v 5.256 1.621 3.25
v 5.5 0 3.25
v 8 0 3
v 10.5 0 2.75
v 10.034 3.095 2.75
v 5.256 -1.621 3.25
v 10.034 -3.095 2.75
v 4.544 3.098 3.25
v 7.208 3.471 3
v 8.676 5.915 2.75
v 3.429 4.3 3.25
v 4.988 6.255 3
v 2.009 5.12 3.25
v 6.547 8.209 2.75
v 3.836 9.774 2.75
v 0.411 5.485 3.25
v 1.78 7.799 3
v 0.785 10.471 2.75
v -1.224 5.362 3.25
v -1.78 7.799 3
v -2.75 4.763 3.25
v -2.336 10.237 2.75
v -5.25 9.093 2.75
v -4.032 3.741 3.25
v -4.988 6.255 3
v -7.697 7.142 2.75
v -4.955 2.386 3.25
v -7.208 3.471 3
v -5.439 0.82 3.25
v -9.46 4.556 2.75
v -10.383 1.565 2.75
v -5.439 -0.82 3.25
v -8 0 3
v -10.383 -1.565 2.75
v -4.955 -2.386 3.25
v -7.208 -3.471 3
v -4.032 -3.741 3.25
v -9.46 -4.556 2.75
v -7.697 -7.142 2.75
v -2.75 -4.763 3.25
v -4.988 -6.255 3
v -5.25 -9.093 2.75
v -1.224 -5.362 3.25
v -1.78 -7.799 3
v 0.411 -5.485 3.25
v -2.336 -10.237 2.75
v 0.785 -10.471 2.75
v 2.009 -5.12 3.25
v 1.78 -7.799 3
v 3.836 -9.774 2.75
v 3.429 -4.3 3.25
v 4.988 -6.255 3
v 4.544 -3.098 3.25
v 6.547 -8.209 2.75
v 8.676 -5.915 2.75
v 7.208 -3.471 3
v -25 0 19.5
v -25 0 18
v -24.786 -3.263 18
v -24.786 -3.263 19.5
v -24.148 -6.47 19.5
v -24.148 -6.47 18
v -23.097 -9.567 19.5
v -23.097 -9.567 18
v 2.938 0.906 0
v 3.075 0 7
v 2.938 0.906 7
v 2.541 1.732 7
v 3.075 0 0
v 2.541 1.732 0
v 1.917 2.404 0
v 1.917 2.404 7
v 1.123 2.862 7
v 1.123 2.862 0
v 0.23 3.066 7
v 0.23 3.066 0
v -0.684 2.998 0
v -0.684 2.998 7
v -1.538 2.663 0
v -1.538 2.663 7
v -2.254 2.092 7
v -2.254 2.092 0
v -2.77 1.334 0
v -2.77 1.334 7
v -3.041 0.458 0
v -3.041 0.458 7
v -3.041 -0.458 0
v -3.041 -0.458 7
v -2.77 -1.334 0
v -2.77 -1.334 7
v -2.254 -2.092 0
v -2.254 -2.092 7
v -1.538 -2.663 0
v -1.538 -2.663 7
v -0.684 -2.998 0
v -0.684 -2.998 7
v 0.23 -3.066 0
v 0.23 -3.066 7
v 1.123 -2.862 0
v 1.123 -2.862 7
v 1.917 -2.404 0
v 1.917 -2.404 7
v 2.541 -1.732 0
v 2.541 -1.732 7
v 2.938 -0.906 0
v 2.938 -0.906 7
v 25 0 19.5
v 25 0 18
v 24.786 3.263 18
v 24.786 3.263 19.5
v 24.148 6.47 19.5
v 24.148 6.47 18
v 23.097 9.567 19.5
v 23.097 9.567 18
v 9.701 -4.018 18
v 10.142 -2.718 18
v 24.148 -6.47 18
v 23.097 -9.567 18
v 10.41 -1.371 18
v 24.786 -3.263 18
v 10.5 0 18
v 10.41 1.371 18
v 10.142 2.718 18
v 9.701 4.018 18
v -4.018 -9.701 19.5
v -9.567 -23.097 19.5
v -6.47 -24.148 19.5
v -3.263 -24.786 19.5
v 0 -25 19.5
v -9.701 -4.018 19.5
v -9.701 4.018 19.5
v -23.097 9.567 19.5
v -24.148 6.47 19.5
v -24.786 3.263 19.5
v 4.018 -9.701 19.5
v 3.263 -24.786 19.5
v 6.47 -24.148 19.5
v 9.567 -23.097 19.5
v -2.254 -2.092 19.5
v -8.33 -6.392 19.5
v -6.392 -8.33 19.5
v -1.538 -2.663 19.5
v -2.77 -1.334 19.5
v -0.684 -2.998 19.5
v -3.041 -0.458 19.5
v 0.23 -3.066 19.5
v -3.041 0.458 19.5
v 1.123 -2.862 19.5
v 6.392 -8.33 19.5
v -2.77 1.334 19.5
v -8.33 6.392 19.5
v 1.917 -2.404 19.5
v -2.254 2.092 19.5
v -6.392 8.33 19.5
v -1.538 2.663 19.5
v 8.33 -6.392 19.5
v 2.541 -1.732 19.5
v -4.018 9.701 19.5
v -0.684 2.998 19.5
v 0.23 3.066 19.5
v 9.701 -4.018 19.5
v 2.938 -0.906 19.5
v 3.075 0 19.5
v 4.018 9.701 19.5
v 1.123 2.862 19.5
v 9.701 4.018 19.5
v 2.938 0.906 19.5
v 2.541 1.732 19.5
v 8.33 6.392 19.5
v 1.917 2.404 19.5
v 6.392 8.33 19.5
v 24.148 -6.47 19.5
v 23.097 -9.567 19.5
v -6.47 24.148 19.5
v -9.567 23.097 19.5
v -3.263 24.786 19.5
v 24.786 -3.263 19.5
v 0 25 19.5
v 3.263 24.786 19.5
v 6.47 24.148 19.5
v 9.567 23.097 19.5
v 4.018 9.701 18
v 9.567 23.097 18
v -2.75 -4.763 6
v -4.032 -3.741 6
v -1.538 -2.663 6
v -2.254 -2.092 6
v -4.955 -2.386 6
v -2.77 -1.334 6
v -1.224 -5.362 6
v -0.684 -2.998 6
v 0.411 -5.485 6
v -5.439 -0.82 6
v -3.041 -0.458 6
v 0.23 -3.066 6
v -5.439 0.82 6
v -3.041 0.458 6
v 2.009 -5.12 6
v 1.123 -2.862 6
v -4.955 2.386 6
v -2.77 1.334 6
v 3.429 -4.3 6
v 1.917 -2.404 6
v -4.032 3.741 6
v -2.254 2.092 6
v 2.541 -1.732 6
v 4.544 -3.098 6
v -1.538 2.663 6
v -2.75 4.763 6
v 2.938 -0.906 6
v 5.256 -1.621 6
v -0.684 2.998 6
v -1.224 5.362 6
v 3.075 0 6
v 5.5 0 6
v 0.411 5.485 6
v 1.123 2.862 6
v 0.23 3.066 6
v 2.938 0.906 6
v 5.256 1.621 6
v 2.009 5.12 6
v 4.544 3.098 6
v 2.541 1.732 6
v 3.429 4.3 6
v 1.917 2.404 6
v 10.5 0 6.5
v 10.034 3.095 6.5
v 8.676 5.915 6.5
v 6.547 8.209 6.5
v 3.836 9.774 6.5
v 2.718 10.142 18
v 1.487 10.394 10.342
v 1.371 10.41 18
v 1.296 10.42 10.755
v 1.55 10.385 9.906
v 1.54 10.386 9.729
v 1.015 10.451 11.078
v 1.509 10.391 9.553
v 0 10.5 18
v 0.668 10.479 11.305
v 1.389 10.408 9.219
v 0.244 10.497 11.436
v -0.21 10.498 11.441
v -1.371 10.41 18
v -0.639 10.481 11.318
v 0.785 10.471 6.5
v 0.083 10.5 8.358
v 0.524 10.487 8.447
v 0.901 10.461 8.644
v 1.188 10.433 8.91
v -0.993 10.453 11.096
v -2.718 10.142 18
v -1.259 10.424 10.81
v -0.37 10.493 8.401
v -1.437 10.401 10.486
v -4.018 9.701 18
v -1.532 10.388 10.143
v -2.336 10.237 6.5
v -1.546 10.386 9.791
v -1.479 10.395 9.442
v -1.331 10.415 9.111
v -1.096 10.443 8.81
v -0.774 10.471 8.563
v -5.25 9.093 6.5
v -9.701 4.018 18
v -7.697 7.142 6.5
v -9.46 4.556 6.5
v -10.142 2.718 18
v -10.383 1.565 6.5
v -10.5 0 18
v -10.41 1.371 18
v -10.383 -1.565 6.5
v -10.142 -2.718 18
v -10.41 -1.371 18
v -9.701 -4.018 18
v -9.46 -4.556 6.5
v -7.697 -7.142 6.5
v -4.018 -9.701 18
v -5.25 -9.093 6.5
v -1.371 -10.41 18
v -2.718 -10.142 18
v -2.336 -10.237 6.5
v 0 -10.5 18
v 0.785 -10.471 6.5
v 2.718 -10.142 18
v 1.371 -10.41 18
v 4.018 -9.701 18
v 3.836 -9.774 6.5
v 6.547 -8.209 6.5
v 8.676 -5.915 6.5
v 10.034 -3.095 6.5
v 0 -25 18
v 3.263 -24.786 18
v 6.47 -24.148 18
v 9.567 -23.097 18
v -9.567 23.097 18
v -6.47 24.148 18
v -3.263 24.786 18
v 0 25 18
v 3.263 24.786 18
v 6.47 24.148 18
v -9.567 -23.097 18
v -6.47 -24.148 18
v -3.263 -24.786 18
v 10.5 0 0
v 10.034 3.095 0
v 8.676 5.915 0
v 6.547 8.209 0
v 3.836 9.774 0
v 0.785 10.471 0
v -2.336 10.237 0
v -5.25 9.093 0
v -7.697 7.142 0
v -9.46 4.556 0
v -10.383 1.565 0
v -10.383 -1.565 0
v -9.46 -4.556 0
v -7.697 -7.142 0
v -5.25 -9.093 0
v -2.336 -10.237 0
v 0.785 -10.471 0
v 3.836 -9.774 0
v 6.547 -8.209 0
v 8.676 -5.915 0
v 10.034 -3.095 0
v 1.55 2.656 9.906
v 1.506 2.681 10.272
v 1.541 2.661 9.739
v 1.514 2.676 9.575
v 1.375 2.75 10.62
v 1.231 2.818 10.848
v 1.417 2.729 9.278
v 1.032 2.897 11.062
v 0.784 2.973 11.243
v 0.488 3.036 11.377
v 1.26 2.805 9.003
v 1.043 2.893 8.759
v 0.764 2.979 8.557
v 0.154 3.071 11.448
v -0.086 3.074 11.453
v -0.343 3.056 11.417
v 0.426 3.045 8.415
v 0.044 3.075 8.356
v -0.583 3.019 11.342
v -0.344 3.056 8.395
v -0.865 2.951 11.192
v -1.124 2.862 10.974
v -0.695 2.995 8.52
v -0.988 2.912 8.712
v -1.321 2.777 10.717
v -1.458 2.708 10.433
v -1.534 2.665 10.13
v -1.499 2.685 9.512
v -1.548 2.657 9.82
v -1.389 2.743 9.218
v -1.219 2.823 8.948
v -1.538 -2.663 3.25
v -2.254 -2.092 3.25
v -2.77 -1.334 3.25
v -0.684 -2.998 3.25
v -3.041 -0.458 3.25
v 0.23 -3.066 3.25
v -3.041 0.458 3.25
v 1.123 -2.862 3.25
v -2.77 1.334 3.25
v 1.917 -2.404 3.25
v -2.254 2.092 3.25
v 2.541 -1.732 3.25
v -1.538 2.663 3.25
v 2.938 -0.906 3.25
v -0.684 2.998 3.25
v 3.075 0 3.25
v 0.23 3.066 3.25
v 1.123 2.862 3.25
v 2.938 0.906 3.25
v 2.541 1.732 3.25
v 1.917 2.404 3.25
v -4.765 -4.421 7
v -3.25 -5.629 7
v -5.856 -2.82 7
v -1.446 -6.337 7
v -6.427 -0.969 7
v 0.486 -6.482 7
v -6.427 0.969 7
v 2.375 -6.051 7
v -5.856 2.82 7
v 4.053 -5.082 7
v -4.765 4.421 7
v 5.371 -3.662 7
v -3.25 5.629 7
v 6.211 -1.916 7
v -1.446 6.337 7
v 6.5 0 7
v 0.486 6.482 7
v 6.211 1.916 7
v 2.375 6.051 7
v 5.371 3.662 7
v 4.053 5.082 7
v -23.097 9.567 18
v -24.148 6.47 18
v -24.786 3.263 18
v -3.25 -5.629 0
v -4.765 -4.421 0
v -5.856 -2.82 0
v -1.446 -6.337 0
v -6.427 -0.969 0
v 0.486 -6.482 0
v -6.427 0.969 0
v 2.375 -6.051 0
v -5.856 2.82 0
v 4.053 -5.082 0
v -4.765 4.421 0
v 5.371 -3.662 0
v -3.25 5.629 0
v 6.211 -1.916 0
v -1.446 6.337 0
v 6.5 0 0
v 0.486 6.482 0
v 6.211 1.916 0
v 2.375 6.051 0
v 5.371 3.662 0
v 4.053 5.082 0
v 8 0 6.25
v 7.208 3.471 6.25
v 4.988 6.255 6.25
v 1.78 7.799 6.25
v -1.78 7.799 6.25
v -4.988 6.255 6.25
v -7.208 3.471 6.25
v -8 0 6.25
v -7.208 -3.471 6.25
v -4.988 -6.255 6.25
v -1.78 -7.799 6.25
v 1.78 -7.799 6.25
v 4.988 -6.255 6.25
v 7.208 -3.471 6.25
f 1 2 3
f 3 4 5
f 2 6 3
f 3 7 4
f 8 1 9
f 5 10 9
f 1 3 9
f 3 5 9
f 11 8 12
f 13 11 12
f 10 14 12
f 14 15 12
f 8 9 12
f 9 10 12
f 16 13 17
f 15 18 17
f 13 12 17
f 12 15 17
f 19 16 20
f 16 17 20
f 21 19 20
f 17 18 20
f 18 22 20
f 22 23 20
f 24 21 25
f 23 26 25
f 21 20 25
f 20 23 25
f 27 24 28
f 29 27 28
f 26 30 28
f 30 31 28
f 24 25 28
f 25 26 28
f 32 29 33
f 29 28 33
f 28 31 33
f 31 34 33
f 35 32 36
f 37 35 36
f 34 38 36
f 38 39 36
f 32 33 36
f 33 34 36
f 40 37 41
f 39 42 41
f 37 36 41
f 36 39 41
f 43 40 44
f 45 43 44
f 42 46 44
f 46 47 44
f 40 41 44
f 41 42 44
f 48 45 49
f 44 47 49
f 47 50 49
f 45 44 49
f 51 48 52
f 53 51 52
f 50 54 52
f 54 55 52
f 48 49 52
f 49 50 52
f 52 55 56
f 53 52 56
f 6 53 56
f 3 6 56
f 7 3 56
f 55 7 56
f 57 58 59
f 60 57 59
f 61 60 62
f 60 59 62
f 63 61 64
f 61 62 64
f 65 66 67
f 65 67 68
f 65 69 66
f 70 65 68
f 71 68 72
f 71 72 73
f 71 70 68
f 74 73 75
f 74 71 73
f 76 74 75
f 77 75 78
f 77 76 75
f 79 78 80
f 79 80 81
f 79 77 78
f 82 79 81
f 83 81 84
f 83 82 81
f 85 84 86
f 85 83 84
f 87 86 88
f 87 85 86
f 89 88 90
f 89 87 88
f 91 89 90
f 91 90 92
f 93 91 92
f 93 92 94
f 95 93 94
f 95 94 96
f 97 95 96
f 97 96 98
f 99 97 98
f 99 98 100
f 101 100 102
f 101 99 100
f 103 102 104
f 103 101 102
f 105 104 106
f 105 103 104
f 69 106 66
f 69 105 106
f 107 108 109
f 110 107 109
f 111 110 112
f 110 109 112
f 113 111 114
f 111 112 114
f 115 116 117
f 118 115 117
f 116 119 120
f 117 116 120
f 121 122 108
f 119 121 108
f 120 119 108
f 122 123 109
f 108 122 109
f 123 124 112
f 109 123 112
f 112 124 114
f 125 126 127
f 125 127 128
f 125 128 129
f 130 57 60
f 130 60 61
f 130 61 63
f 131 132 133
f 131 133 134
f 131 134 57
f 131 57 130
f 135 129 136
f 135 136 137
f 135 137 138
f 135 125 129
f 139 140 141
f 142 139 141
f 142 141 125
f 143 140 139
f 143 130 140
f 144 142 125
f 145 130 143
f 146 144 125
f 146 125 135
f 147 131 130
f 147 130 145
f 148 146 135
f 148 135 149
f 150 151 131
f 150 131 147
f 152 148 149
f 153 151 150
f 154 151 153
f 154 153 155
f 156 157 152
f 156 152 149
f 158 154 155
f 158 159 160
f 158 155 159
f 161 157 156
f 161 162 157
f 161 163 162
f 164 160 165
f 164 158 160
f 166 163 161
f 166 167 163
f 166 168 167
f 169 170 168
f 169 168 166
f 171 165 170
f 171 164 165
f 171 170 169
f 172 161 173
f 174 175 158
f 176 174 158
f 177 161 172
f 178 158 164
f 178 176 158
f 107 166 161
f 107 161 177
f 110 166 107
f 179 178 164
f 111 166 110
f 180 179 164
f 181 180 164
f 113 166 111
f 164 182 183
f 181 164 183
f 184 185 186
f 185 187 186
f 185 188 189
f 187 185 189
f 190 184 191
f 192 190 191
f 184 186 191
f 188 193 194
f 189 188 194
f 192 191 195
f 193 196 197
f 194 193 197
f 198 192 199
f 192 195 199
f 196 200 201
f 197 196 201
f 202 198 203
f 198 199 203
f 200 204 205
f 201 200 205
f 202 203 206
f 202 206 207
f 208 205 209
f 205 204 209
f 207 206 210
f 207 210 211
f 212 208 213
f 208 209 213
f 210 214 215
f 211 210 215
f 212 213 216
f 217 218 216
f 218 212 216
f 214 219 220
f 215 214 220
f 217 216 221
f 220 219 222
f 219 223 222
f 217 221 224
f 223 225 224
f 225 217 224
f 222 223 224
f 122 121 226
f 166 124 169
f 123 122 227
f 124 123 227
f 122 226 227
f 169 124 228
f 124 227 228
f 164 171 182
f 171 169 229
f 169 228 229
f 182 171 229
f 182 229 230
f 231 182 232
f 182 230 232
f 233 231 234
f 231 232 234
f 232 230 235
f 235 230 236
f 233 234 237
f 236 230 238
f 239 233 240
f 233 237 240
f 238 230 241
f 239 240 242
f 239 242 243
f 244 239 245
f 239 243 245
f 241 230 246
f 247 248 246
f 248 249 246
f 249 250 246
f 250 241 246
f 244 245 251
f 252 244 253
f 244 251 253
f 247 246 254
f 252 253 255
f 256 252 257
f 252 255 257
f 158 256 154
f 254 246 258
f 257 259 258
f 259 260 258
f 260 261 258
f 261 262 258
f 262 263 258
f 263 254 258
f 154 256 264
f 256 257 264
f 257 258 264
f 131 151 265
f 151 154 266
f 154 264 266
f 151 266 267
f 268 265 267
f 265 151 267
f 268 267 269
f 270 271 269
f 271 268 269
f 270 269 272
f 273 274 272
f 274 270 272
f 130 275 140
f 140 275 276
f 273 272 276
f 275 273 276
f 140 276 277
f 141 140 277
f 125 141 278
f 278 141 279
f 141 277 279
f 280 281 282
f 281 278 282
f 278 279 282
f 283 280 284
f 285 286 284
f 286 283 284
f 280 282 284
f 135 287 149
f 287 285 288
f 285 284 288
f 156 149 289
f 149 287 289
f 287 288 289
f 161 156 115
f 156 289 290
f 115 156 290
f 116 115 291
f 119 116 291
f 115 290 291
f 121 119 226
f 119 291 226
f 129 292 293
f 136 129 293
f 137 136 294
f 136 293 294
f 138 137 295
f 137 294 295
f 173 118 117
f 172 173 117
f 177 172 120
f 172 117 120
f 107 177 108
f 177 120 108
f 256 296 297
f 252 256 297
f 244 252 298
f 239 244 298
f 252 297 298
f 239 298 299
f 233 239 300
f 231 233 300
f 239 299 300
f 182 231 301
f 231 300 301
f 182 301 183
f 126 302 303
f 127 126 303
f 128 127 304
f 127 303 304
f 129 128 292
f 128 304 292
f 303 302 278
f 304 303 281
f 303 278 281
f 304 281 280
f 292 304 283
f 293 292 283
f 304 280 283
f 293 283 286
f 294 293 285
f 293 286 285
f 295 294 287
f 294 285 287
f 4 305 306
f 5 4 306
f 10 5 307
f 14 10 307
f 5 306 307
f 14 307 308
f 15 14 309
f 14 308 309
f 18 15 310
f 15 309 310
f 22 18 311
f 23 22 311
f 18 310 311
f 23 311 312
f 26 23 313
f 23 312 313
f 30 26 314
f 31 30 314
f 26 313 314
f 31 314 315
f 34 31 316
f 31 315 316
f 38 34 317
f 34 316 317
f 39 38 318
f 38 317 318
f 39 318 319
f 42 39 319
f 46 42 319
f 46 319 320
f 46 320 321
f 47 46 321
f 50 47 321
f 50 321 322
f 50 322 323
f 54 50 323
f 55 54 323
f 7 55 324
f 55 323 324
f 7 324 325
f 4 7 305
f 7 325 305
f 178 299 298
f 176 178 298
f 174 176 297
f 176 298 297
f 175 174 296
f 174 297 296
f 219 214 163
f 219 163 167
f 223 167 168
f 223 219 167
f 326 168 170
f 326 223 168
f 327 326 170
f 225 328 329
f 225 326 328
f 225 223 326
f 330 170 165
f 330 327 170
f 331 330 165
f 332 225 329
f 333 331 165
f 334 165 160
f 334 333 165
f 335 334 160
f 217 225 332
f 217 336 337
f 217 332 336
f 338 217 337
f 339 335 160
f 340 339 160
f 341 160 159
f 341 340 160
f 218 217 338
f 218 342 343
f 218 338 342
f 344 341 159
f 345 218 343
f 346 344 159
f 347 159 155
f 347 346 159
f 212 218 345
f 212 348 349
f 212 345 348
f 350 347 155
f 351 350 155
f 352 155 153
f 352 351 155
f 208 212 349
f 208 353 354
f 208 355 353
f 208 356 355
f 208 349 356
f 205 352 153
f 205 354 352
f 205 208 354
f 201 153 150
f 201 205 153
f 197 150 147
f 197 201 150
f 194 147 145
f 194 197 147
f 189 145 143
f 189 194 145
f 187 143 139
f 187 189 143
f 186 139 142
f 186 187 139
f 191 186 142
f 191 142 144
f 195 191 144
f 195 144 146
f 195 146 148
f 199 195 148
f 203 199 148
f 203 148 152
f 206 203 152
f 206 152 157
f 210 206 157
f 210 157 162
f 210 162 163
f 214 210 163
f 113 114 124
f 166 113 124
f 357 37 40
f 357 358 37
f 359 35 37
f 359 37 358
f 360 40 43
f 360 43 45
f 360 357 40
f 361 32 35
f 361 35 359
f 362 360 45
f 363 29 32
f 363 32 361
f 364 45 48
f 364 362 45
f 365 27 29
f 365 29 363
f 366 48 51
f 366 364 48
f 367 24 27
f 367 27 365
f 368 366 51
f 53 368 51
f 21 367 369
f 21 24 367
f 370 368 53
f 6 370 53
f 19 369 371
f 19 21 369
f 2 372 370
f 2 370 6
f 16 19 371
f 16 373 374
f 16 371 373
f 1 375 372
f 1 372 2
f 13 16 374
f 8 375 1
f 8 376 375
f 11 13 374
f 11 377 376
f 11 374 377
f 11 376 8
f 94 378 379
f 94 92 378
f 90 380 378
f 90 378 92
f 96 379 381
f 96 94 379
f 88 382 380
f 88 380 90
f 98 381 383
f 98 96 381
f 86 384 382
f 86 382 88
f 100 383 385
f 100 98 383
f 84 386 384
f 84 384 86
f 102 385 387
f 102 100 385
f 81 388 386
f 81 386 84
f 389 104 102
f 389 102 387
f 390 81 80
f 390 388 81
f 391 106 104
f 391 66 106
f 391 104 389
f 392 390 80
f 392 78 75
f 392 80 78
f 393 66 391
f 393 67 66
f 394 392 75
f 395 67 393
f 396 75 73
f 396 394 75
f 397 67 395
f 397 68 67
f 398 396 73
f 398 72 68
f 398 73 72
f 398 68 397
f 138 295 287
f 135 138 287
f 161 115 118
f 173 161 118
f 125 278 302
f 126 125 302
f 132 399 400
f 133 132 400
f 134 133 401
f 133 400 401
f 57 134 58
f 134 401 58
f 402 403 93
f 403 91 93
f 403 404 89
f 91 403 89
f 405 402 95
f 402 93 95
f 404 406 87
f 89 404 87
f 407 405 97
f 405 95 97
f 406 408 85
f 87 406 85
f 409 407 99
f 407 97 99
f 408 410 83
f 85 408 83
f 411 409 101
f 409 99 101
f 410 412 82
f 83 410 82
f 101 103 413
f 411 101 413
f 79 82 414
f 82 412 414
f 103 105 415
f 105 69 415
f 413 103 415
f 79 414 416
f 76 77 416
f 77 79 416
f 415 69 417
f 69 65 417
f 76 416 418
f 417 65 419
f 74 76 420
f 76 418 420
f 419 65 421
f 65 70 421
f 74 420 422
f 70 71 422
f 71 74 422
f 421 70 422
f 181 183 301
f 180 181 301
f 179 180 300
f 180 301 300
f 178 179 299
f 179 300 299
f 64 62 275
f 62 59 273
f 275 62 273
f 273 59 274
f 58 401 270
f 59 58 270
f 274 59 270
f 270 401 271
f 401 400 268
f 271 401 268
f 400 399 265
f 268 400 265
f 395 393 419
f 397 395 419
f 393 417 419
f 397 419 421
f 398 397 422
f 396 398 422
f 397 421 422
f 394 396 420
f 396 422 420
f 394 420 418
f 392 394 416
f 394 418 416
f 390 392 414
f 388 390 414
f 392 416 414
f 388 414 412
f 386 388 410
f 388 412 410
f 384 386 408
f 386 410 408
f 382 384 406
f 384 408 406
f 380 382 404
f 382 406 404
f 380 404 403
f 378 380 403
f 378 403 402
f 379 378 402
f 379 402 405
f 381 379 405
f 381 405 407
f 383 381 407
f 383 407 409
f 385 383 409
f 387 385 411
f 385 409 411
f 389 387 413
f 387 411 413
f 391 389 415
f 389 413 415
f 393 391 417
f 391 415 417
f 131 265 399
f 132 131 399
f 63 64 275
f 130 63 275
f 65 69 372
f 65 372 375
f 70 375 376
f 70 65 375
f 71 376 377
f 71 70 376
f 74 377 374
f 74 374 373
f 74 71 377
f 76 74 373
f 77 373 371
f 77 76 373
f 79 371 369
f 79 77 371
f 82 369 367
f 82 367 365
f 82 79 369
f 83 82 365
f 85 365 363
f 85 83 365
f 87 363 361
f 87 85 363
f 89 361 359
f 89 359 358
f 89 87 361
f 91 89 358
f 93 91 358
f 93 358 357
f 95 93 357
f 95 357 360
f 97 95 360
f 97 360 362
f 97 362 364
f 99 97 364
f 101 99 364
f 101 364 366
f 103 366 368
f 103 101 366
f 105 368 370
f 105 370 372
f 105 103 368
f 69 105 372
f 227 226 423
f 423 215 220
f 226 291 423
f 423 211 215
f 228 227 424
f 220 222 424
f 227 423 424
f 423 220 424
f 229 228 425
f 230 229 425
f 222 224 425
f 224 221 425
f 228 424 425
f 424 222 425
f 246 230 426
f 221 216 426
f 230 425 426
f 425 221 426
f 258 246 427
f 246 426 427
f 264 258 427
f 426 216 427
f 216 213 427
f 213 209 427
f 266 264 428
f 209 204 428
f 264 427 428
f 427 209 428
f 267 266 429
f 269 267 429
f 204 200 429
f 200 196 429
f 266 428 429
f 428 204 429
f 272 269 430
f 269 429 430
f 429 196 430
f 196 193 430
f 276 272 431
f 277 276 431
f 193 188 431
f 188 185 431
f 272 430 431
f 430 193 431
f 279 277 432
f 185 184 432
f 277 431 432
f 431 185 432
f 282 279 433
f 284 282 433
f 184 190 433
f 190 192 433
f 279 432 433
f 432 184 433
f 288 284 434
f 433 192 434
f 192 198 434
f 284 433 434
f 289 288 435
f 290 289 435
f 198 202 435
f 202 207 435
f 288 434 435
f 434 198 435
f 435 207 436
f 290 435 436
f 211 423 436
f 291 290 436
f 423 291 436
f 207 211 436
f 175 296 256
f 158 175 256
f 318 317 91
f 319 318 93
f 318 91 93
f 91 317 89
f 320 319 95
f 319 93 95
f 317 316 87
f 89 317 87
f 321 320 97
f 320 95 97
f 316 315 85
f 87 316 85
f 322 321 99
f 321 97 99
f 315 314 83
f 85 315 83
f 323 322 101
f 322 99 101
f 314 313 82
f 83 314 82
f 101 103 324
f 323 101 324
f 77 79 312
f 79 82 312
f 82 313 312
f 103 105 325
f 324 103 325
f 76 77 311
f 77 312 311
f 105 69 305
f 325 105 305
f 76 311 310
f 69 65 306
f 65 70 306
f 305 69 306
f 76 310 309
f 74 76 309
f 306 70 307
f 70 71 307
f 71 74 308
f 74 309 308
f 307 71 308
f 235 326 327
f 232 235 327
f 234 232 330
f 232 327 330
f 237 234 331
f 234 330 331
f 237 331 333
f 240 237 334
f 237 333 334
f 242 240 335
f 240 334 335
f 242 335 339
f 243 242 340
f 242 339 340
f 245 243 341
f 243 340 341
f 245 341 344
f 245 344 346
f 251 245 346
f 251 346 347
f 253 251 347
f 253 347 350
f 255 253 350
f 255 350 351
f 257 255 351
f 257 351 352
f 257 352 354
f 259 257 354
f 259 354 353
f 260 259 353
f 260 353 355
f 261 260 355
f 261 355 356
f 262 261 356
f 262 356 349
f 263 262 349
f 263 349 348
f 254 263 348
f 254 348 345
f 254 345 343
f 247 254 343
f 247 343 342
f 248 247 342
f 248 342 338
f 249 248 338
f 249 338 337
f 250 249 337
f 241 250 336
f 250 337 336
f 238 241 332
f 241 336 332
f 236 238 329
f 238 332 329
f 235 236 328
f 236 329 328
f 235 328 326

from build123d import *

# Parameters (mm, degrees)
F0_R      = 10.5
F0_R_2    = 6.5
F0_R_3    = 3.075
F1_DEPTH  = 3.25
F2_DEPTH  = 6
F3_R      = 10.5
F3_R_2    = 6.5
F3_R_3    = 3.075
F4_DEPTH  = 12
F6_DEPTH  = 1.5
F7_DEPTH  = 1.5
F8_R      = 1.55
F9_DEPTH  = 20
F10_SIZE2 = 0.5
F10_SIZE  = 5
F11_SIZE2 = 5
F11_SIZE  = 0.5
F12_DEPTH = 1


with BuildPart() as f1:
    # F0 (on Top) → F1 (new body)
    with BuildSketch(Plane.XY):
        Circle(F0_R)
        Circle(F0_R_2, mode=Mode.SUBTRACT)
        Circle(F0_R_2)
        Circle(F0_R_3, mode=Mode.SUBTRACT)
    extrude(amount=F1_DEPTH)

    # F10
    f10_edges = [f1.edges().sort_by_distance(p)[0] for p in [
        (-10.5, 0, 3.25),
    ]]
    f10_side = f1.faces().sort_by_distance((-3.371985, 0, 3.25))[0]
    chamfer(f10_edges, length=F10_SIZE, length2=F10_SIZE2, reference=f10_side)


with BuildPart() as f2:
    # F0 (on Top) → F2 (new body)
    with BuildSketch(Plane.XY):
        Circle(F0_R_2)
        Circle(F0_R_3, mode=Mode.SUBTRACT)
    extrude(amount=F2_DEPTH)

    # F12 (add): a face of the model
    f12_faces = [f2.faces().sort_by_distance(p)[0] for p in [
        (-6.3161522369, 0, 6),
    ]]
    extrude(f12_faces, amount=F12_DEPTH)


with BuildPart() as f4:
    # F3 (on face) → F4 (new body)
    with BuildSketch(Plane.XY.offset(6)):
        Circle(F3_R)
        Circle(F3_R_2, mode=Mode.SUBTRACT)
        Circle(F3_R_2)
        Circle(F3_R_3, mode=Mode.SUBTRACT)
    extrude(amount=F4_DEPTH)

    # F5 (on face) → F6 (join)
    with BuildSketch(Plane.XY.offset(18)):
        with BuildLine():
            Line((-25, 0), (-10.5, 0))
            ThreePointArc((-10.5, 0), (-10.2982454442, 2.0484483812), (-9.7007350914, 4.0181760398))
            Line((-9.7007350914, 4.0181760398), (-23.0969883128, 9.5670858091))
            ThreePointArc((-23.0969883128, 9.5670858091), (-24.5196320101, 4.8772580504), (-25, 0))
        make_face()
        with BuildLine():
            ThreePointArc((-9.7007350914, -4.0181760398), (-10.2982454442, -2.0484483812), (-10.5, 0))
            Line((-10.5, 0), (-25, 0))
            ThreePointArc((-25, 0), (-24.5196320101, -4.8772580504), (-23.0969883128, -9.5670858091))
            Line((-23.0969883128, -9.5670858091), (-9.7007350914, -4.0181760398))
        make_face()
        with BuildLine():
            ThreePointArc((-9.5670858091, -23.0969883128), (-4.8772580504, -24.5196320101), (0, -25))
            Line((0, -25), (0, -10.5))
            ThreePointArc((0, -10.5), (-2.0484483812, -10.2982454442), (-4.0181760398, -9.7007350914))
            Line((-4.0181760398, -9.7007350914), (-9.5670858091, -23.0969883128))
        make_face()
        with BuildLine():
            ThreePointArc((0, -25), (4.8772580504, -24.5196320101), (9.5670858091, -23.0969883128))
            Line((9.5670858091, -23.0969883128), (4.0181760398, -9.7007350914))
            ThreePointArc((4.0181760398, -9.7007350914), (2.0484483812, -10.2982454442), (0, -10.5))
            Line((0, -10.5), (0, -25))
        make_face()
        with BuildLine():
            ThreePointArc((23.0969883128, -9.5670858091), (24.5196320101, -4.8772580504), (25, 0))
            Line((25, 0), (10.5, 0))
            ThreePointArc((10.5, 0), (10.2982454442, -2.0484483812), (9.7007350914, -4.0181760398))
            Line((9.7007350914, -4.0181760398), (23.0969883128, -9.5670858091))
        make_face()
        with BuildLine():
            Line((10.5, 0), (25, 0))
            ThreePointArc((25, 0), (24.5196320101, 4.8772580504), (23.0969883128, 9.5670858091))
            Line((23.0969883128, 9.5670858091), (9.7007350914, 4.0181760398))
            ThreePointArc((9.7007350914, 4.0181760398), (10.2982454442, 2.0484483812), (10.5, 0))
        make_face()
        with BuildLine():
            Line((4.0181760398, 9.7007350914), (9.5670858091, 23.0969883128))
            ThreePointArc((9.5670858091, 23.0969883128), (4.8772580504, 24.5196320101), (0, 25))
            Line((0, 25), (0, 10.5))
            ThreePointArc((0, 10.5), (2.0484483812, 10.2982454442), (4.0181760398, 9.7007350914))
        make_face()
        with BuildLine():
            Line((0, 10.5), (0, 25))
            ThreePointArc((0, 25), (-4.8772580504, 24.5196320101), (-9.5670858091, 23.0969883128))
            Line((-9.5670858091, 23.0969883128), (-4.0181760398, 9.7007350914))
            ThreePointArc((-4.0181760398, 9.7007350914), (-2.0484483812, 10.2982454442), (0, 10.5))
        make_face()
    extrude(amount=F6_DEPTH)

    # F7 (add): a face of the model
    f7_faces = [f4.faces().sort_by_distance(p)[0] for p in [
        (10.0069670767, 1.9905095115, 18),
    ]]
    extrude(f7_faces, amount=F7_DEPTH)

    # F8 (on Front) → F9 (cut)
    with BuildSketch(Plane.XZ):
        with Locations((0, 9.9058225751)):
            Circle(F8_R)
    extrude(amount=-F9_DEPTH, mode=Mode.SUBTRACT)

    # F11
    f11_edges = [f4.edges().sort_by_distance(p)[0] for p in [
        (-10.5, 0, 6),
    ]]
    f11_side = f4.faces().sort_by_distance((-10.5, 0, 12.75))[0]
    chamfer(f11_edges, length=F11_SIZE, length2=F11_SIZE2, reference=f11_side)


solid = Compound([f1.part, f2.part, f4.part])
